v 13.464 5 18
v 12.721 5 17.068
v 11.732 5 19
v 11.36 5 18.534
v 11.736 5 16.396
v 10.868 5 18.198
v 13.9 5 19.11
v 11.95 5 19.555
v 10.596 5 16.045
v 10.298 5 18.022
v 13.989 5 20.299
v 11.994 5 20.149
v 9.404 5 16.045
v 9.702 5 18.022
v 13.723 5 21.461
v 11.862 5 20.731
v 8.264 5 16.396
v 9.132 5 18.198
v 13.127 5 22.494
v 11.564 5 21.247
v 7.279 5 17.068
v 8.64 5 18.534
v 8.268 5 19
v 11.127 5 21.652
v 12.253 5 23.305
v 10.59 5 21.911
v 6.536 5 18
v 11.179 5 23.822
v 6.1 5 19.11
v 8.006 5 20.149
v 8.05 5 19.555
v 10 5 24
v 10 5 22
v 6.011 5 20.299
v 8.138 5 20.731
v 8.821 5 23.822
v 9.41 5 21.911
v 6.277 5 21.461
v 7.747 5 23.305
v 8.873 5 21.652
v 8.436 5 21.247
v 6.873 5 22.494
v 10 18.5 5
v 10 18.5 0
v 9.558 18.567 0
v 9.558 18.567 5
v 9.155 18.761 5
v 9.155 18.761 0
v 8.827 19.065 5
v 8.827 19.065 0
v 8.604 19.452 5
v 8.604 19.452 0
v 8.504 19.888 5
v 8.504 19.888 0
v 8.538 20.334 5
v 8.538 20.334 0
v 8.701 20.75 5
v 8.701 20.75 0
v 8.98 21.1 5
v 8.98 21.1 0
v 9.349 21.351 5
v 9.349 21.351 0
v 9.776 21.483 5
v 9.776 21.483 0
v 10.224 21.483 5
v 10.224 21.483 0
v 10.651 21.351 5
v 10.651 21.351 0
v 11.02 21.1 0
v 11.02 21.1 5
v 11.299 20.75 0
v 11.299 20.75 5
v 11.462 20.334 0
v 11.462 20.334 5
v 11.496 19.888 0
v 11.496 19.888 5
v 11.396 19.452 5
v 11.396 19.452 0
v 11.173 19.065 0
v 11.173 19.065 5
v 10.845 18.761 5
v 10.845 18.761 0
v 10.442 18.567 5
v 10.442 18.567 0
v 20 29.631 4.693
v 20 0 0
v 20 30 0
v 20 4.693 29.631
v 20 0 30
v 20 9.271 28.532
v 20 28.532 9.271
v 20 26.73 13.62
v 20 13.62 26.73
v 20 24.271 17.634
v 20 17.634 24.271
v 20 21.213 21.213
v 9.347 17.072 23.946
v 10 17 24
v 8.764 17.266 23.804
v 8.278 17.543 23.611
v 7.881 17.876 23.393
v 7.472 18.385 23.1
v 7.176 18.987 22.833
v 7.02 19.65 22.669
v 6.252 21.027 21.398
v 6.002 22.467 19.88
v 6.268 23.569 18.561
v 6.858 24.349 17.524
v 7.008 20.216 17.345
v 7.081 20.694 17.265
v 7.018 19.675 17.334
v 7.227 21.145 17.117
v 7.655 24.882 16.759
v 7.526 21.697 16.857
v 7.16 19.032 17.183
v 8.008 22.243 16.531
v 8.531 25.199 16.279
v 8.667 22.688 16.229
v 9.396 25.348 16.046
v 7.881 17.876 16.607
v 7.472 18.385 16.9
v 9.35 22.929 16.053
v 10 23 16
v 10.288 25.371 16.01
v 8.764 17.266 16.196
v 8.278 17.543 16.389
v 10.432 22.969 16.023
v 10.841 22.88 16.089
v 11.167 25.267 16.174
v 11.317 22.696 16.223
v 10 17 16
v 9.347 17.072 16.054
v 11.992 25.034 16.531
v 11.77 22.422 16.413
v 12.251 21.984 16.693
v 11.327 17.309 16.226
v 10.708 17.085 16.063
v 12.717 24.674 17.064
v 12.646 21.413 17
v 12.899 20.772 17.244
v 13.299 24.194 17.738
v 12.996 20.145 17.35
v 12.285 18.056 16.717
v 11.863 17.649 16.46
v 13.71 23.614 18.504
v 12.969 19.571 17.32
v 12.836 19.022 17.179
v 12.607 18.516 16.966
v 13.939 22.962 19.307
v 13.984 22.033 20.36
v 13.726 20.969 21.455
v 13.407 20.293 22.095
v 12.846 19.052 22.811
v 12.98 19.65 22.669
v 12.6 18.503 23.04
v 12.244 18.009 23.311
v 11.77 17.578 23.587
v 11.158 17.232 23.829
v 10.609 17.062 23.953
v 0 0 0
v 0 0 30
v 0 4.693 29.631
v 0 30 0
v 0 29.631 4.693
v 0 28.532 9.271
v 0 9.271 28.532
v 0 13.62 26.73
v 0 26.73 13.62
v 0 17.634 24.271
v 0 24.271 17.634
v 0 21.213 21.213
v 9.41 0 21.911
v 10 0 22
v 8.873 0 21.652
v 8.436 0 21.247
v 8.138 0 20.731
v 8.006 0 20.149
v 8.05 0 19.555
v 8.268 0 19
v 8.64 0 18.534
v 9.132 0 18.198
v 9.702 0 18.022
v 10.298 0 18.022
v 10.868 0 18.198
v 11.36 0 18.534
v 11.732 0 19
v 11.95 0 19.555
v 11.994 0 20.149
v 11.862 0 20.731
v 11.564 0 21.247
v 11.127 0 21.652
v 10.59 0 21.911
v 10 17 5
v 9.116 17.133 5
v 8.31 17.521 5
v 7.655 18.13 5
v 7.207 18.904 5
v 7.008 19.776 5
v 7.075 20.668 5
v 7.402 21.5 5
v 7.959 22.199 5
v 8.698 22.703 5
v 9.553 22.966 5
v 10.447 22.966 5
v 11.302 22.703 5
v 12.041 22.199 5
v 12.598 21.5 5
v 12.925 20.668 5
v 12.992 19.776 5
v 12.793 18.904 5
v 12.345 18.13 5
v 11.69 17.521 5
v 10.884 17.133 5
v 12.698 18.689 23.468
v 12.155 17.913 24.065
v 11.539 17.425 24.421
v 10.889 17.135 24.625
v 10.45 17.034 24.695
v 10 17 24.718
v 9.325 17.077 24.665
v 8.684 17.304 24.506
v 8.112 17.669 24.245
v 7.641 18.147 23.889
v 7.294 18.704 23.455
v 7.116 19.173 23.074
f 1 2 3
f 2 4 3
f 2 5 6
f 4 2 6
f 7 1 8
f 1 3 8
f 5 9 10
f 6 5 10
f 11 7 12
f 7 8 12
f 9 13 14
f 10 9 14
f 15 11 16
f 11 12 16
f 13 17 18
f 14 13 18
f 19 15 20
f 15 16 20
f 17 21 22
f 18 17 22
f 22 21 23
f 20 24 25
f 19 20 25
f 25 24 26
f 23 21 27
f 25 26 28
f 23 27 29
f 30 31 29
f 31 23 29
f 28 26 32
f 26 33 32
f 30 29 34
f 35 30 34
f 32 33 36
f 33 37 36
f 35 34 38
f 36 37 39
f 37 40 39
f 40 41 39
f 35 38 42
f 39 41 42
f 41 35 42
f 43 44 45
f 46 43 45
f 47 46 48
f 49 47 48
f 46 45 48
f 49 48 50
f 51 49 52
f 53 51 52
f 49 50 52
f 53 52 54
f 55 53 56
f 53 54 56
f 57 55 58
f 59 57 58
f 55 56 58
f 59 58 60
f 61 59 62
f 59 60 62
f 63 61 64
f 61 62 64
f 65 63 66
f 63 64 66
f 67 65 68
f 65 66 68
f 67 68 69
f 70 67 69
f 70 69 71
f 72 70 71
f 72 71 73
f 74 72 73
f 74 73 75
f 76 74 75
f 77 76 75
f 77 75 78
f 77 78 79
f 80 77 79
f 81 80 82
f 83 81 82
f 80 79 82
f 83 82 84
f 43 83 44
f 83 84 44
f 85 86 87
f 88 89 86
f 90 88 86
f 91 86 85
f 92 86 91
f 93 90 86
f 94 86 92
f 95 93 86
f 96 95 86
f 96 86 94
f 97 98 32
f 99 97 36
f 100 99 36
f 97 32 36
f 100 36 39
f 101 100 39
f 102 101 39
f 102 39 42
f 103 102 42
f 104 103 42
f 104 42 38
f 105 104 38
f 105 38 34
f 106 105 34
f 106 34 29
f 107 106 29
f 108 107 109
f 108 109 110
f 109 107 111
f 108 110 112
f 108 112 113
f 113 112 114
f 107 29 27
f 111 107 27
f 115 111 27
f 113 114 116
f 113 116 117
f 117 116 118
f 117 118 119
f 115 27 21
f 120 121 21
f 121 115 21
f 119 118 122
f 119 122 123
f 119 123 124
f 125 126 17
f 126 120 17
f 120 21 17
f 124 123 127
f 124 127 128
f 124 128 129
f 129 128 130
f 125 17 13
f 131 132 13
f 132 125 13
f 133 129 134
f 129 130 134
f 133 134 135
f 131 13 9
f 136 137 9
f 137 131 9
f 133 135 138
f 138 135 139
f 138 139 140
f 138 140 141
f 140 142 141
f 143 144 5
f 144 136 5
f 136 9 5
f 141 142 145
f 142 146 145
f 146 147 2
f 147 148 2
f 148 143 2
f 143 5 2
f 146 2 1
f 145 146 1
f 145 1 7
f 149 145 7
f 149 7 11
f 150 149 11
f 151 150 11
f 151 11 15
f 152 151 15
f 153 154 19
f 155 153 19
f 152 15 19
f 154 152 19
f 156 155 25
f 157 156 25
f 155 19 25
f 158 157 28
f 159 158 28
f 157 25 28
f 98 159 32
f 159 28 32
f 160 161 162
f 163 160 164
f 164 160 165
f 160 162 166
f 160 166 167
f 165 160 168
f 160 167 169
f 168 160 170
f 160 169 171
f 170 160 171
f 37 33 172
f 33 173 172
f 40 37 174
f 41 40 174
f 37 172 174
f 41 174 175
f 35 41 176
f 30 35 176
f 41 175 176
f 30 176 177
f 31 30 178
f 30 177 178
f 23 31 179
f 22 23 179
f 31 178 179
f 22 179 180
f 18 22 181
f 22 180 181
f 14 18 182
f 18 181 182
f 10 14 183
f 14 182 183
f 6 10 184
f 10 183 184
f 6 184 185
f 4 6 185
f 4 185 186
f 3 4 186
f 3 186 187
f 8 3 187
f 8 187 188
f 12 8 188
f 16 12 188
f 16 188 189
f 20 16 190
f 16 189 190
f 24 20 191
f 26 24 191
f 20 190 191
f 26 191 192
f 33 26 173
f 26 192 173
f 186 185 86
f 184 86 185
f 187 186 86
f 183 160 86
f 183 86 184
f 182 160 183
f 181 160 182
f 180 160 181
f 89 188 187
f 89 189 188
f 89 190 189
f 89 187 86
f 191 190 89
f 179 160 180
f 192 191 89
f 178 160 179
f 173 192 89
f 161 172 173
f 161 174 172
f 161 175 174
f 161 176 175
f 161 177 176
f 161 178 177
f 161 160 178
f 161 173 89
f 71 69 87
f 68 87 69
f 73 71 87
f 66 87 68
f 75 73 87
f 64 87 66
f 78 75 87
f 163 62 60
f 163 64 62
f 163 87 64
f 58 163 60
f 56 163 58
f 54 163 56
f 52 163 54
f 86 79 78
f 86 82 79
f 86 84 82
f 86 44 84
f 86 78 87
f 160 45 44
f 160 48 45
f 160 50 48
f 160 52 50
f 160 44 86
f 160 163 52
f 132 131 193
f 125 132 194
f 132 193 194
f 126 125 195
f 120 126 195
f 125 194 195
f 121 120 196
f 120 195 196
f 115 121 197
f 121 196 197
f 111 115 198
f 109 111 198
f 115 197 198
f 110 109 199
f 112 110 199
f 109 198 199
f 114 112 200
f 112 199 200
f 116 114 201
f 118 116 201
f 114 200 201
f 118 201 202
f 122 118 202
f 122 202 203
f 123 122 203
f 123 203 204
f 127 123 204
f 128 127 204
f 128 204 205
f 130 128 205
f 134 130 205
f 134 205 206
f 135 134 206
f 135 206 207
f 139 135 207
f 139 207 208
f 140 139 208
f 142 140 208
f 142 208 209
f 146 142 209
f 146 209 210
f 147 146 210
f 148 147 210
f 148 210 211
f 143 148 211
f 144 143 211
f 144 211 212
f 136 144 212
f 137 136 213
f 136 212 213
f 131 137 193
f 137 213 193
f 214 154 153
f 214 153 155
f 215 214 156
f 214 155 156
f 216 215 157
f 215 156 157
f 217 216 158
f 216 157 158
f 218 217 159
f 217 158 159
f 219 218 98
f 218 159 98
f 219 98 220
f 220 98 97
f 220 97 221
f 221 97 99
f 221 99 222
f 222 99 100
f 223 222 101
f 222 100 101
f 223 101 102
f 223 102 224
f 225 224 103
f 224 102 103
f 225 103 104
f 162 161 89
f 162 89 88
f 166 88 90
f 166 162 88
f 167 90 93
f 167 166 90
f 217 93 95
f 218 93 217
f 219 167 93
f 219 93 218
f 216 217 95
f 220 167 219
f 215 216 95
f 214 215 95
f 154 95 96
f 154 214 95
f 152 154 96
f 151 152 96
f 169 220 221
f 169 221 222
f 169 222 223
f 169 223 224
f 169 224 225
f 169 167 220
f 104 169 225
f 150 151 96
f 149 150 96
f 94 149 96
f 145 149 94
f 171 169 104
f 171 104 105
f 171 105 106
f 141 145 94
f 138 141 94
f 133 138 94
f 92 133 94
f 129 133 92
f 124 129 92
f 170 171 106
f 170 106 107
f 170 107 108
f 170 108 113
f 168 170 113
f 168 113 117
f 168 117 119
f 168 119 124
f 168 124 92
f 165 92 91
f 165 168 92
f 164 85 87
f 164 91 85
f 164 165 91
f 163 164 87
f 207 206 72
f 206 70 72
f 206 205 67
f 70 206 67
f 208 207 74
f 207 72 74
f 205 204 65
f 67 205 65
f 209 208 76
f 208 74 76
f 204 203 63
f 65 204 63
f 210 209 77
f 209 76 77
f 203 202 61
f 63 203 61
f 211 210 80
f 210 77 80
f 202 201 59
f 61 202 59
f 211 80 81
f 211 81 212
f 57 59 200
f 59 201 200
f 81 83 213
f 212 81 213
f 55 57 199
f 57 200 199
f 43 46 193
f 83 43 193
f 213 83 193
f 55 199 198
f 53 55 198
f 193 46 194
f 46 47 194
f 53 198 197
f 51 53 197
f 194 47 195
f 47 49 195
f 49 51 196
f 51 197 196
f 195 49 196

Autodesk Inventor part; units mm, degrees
ref_plane "YZ Plane" through (0, 0, 0) normal (1, 0, 0) x (0, 1, 0)
sketch "草圖1" plane through (0, 0, 0) normal (1, 0, 0) x (0, 1, 0)
  line L0 (0, 0) -> (0, 30)
  arc A0 (30, 0) -> (0, 30) centre (0, 0) ccw
  line L1 (30, 0) -> (0, 0)
  dimension "d0" = 30
extrude "擠出1" add sketch "草圖1" along normal blind 20
ref_plane "工作平面1" through (0, 30, 0) normal (0, -1, 0) x (1, 0, 0)
sketch "草圖2" plane through (0, 30, 0) normal (0, -1, 0) x (1, 0, 0)
  line L0 (0, 0) -> (20, 0) projected
  point P0 (10, 20)
  point P1 (10, 0)
  dimension "d3" = 20
hole "孔1" at (10, 30, 20) direction (0, -1, 0) diameter 4 end through all counterbore diameter 8 counterbore depth 25
ref_plane "工作平面2" through (10, 0, 30) normal (0, 0, -1) x (-1, 0, 0)
sketch "草圖3" plane through (10, 0, 30) normal (0, 0, -1) x (-1, 0, 0)
  line L0 (10, 0) -> (-10, 0) projected
  point P0 (0, 20)
  point P1 (0, 0)
  dimension "d11" = 20
hole "孔2" at (10, 20, 30) direction (0, 0, -1) diameter 3 end through all counterbore diameter 6 counterbore depth 25
properties part number "鋁擠固定器小"
